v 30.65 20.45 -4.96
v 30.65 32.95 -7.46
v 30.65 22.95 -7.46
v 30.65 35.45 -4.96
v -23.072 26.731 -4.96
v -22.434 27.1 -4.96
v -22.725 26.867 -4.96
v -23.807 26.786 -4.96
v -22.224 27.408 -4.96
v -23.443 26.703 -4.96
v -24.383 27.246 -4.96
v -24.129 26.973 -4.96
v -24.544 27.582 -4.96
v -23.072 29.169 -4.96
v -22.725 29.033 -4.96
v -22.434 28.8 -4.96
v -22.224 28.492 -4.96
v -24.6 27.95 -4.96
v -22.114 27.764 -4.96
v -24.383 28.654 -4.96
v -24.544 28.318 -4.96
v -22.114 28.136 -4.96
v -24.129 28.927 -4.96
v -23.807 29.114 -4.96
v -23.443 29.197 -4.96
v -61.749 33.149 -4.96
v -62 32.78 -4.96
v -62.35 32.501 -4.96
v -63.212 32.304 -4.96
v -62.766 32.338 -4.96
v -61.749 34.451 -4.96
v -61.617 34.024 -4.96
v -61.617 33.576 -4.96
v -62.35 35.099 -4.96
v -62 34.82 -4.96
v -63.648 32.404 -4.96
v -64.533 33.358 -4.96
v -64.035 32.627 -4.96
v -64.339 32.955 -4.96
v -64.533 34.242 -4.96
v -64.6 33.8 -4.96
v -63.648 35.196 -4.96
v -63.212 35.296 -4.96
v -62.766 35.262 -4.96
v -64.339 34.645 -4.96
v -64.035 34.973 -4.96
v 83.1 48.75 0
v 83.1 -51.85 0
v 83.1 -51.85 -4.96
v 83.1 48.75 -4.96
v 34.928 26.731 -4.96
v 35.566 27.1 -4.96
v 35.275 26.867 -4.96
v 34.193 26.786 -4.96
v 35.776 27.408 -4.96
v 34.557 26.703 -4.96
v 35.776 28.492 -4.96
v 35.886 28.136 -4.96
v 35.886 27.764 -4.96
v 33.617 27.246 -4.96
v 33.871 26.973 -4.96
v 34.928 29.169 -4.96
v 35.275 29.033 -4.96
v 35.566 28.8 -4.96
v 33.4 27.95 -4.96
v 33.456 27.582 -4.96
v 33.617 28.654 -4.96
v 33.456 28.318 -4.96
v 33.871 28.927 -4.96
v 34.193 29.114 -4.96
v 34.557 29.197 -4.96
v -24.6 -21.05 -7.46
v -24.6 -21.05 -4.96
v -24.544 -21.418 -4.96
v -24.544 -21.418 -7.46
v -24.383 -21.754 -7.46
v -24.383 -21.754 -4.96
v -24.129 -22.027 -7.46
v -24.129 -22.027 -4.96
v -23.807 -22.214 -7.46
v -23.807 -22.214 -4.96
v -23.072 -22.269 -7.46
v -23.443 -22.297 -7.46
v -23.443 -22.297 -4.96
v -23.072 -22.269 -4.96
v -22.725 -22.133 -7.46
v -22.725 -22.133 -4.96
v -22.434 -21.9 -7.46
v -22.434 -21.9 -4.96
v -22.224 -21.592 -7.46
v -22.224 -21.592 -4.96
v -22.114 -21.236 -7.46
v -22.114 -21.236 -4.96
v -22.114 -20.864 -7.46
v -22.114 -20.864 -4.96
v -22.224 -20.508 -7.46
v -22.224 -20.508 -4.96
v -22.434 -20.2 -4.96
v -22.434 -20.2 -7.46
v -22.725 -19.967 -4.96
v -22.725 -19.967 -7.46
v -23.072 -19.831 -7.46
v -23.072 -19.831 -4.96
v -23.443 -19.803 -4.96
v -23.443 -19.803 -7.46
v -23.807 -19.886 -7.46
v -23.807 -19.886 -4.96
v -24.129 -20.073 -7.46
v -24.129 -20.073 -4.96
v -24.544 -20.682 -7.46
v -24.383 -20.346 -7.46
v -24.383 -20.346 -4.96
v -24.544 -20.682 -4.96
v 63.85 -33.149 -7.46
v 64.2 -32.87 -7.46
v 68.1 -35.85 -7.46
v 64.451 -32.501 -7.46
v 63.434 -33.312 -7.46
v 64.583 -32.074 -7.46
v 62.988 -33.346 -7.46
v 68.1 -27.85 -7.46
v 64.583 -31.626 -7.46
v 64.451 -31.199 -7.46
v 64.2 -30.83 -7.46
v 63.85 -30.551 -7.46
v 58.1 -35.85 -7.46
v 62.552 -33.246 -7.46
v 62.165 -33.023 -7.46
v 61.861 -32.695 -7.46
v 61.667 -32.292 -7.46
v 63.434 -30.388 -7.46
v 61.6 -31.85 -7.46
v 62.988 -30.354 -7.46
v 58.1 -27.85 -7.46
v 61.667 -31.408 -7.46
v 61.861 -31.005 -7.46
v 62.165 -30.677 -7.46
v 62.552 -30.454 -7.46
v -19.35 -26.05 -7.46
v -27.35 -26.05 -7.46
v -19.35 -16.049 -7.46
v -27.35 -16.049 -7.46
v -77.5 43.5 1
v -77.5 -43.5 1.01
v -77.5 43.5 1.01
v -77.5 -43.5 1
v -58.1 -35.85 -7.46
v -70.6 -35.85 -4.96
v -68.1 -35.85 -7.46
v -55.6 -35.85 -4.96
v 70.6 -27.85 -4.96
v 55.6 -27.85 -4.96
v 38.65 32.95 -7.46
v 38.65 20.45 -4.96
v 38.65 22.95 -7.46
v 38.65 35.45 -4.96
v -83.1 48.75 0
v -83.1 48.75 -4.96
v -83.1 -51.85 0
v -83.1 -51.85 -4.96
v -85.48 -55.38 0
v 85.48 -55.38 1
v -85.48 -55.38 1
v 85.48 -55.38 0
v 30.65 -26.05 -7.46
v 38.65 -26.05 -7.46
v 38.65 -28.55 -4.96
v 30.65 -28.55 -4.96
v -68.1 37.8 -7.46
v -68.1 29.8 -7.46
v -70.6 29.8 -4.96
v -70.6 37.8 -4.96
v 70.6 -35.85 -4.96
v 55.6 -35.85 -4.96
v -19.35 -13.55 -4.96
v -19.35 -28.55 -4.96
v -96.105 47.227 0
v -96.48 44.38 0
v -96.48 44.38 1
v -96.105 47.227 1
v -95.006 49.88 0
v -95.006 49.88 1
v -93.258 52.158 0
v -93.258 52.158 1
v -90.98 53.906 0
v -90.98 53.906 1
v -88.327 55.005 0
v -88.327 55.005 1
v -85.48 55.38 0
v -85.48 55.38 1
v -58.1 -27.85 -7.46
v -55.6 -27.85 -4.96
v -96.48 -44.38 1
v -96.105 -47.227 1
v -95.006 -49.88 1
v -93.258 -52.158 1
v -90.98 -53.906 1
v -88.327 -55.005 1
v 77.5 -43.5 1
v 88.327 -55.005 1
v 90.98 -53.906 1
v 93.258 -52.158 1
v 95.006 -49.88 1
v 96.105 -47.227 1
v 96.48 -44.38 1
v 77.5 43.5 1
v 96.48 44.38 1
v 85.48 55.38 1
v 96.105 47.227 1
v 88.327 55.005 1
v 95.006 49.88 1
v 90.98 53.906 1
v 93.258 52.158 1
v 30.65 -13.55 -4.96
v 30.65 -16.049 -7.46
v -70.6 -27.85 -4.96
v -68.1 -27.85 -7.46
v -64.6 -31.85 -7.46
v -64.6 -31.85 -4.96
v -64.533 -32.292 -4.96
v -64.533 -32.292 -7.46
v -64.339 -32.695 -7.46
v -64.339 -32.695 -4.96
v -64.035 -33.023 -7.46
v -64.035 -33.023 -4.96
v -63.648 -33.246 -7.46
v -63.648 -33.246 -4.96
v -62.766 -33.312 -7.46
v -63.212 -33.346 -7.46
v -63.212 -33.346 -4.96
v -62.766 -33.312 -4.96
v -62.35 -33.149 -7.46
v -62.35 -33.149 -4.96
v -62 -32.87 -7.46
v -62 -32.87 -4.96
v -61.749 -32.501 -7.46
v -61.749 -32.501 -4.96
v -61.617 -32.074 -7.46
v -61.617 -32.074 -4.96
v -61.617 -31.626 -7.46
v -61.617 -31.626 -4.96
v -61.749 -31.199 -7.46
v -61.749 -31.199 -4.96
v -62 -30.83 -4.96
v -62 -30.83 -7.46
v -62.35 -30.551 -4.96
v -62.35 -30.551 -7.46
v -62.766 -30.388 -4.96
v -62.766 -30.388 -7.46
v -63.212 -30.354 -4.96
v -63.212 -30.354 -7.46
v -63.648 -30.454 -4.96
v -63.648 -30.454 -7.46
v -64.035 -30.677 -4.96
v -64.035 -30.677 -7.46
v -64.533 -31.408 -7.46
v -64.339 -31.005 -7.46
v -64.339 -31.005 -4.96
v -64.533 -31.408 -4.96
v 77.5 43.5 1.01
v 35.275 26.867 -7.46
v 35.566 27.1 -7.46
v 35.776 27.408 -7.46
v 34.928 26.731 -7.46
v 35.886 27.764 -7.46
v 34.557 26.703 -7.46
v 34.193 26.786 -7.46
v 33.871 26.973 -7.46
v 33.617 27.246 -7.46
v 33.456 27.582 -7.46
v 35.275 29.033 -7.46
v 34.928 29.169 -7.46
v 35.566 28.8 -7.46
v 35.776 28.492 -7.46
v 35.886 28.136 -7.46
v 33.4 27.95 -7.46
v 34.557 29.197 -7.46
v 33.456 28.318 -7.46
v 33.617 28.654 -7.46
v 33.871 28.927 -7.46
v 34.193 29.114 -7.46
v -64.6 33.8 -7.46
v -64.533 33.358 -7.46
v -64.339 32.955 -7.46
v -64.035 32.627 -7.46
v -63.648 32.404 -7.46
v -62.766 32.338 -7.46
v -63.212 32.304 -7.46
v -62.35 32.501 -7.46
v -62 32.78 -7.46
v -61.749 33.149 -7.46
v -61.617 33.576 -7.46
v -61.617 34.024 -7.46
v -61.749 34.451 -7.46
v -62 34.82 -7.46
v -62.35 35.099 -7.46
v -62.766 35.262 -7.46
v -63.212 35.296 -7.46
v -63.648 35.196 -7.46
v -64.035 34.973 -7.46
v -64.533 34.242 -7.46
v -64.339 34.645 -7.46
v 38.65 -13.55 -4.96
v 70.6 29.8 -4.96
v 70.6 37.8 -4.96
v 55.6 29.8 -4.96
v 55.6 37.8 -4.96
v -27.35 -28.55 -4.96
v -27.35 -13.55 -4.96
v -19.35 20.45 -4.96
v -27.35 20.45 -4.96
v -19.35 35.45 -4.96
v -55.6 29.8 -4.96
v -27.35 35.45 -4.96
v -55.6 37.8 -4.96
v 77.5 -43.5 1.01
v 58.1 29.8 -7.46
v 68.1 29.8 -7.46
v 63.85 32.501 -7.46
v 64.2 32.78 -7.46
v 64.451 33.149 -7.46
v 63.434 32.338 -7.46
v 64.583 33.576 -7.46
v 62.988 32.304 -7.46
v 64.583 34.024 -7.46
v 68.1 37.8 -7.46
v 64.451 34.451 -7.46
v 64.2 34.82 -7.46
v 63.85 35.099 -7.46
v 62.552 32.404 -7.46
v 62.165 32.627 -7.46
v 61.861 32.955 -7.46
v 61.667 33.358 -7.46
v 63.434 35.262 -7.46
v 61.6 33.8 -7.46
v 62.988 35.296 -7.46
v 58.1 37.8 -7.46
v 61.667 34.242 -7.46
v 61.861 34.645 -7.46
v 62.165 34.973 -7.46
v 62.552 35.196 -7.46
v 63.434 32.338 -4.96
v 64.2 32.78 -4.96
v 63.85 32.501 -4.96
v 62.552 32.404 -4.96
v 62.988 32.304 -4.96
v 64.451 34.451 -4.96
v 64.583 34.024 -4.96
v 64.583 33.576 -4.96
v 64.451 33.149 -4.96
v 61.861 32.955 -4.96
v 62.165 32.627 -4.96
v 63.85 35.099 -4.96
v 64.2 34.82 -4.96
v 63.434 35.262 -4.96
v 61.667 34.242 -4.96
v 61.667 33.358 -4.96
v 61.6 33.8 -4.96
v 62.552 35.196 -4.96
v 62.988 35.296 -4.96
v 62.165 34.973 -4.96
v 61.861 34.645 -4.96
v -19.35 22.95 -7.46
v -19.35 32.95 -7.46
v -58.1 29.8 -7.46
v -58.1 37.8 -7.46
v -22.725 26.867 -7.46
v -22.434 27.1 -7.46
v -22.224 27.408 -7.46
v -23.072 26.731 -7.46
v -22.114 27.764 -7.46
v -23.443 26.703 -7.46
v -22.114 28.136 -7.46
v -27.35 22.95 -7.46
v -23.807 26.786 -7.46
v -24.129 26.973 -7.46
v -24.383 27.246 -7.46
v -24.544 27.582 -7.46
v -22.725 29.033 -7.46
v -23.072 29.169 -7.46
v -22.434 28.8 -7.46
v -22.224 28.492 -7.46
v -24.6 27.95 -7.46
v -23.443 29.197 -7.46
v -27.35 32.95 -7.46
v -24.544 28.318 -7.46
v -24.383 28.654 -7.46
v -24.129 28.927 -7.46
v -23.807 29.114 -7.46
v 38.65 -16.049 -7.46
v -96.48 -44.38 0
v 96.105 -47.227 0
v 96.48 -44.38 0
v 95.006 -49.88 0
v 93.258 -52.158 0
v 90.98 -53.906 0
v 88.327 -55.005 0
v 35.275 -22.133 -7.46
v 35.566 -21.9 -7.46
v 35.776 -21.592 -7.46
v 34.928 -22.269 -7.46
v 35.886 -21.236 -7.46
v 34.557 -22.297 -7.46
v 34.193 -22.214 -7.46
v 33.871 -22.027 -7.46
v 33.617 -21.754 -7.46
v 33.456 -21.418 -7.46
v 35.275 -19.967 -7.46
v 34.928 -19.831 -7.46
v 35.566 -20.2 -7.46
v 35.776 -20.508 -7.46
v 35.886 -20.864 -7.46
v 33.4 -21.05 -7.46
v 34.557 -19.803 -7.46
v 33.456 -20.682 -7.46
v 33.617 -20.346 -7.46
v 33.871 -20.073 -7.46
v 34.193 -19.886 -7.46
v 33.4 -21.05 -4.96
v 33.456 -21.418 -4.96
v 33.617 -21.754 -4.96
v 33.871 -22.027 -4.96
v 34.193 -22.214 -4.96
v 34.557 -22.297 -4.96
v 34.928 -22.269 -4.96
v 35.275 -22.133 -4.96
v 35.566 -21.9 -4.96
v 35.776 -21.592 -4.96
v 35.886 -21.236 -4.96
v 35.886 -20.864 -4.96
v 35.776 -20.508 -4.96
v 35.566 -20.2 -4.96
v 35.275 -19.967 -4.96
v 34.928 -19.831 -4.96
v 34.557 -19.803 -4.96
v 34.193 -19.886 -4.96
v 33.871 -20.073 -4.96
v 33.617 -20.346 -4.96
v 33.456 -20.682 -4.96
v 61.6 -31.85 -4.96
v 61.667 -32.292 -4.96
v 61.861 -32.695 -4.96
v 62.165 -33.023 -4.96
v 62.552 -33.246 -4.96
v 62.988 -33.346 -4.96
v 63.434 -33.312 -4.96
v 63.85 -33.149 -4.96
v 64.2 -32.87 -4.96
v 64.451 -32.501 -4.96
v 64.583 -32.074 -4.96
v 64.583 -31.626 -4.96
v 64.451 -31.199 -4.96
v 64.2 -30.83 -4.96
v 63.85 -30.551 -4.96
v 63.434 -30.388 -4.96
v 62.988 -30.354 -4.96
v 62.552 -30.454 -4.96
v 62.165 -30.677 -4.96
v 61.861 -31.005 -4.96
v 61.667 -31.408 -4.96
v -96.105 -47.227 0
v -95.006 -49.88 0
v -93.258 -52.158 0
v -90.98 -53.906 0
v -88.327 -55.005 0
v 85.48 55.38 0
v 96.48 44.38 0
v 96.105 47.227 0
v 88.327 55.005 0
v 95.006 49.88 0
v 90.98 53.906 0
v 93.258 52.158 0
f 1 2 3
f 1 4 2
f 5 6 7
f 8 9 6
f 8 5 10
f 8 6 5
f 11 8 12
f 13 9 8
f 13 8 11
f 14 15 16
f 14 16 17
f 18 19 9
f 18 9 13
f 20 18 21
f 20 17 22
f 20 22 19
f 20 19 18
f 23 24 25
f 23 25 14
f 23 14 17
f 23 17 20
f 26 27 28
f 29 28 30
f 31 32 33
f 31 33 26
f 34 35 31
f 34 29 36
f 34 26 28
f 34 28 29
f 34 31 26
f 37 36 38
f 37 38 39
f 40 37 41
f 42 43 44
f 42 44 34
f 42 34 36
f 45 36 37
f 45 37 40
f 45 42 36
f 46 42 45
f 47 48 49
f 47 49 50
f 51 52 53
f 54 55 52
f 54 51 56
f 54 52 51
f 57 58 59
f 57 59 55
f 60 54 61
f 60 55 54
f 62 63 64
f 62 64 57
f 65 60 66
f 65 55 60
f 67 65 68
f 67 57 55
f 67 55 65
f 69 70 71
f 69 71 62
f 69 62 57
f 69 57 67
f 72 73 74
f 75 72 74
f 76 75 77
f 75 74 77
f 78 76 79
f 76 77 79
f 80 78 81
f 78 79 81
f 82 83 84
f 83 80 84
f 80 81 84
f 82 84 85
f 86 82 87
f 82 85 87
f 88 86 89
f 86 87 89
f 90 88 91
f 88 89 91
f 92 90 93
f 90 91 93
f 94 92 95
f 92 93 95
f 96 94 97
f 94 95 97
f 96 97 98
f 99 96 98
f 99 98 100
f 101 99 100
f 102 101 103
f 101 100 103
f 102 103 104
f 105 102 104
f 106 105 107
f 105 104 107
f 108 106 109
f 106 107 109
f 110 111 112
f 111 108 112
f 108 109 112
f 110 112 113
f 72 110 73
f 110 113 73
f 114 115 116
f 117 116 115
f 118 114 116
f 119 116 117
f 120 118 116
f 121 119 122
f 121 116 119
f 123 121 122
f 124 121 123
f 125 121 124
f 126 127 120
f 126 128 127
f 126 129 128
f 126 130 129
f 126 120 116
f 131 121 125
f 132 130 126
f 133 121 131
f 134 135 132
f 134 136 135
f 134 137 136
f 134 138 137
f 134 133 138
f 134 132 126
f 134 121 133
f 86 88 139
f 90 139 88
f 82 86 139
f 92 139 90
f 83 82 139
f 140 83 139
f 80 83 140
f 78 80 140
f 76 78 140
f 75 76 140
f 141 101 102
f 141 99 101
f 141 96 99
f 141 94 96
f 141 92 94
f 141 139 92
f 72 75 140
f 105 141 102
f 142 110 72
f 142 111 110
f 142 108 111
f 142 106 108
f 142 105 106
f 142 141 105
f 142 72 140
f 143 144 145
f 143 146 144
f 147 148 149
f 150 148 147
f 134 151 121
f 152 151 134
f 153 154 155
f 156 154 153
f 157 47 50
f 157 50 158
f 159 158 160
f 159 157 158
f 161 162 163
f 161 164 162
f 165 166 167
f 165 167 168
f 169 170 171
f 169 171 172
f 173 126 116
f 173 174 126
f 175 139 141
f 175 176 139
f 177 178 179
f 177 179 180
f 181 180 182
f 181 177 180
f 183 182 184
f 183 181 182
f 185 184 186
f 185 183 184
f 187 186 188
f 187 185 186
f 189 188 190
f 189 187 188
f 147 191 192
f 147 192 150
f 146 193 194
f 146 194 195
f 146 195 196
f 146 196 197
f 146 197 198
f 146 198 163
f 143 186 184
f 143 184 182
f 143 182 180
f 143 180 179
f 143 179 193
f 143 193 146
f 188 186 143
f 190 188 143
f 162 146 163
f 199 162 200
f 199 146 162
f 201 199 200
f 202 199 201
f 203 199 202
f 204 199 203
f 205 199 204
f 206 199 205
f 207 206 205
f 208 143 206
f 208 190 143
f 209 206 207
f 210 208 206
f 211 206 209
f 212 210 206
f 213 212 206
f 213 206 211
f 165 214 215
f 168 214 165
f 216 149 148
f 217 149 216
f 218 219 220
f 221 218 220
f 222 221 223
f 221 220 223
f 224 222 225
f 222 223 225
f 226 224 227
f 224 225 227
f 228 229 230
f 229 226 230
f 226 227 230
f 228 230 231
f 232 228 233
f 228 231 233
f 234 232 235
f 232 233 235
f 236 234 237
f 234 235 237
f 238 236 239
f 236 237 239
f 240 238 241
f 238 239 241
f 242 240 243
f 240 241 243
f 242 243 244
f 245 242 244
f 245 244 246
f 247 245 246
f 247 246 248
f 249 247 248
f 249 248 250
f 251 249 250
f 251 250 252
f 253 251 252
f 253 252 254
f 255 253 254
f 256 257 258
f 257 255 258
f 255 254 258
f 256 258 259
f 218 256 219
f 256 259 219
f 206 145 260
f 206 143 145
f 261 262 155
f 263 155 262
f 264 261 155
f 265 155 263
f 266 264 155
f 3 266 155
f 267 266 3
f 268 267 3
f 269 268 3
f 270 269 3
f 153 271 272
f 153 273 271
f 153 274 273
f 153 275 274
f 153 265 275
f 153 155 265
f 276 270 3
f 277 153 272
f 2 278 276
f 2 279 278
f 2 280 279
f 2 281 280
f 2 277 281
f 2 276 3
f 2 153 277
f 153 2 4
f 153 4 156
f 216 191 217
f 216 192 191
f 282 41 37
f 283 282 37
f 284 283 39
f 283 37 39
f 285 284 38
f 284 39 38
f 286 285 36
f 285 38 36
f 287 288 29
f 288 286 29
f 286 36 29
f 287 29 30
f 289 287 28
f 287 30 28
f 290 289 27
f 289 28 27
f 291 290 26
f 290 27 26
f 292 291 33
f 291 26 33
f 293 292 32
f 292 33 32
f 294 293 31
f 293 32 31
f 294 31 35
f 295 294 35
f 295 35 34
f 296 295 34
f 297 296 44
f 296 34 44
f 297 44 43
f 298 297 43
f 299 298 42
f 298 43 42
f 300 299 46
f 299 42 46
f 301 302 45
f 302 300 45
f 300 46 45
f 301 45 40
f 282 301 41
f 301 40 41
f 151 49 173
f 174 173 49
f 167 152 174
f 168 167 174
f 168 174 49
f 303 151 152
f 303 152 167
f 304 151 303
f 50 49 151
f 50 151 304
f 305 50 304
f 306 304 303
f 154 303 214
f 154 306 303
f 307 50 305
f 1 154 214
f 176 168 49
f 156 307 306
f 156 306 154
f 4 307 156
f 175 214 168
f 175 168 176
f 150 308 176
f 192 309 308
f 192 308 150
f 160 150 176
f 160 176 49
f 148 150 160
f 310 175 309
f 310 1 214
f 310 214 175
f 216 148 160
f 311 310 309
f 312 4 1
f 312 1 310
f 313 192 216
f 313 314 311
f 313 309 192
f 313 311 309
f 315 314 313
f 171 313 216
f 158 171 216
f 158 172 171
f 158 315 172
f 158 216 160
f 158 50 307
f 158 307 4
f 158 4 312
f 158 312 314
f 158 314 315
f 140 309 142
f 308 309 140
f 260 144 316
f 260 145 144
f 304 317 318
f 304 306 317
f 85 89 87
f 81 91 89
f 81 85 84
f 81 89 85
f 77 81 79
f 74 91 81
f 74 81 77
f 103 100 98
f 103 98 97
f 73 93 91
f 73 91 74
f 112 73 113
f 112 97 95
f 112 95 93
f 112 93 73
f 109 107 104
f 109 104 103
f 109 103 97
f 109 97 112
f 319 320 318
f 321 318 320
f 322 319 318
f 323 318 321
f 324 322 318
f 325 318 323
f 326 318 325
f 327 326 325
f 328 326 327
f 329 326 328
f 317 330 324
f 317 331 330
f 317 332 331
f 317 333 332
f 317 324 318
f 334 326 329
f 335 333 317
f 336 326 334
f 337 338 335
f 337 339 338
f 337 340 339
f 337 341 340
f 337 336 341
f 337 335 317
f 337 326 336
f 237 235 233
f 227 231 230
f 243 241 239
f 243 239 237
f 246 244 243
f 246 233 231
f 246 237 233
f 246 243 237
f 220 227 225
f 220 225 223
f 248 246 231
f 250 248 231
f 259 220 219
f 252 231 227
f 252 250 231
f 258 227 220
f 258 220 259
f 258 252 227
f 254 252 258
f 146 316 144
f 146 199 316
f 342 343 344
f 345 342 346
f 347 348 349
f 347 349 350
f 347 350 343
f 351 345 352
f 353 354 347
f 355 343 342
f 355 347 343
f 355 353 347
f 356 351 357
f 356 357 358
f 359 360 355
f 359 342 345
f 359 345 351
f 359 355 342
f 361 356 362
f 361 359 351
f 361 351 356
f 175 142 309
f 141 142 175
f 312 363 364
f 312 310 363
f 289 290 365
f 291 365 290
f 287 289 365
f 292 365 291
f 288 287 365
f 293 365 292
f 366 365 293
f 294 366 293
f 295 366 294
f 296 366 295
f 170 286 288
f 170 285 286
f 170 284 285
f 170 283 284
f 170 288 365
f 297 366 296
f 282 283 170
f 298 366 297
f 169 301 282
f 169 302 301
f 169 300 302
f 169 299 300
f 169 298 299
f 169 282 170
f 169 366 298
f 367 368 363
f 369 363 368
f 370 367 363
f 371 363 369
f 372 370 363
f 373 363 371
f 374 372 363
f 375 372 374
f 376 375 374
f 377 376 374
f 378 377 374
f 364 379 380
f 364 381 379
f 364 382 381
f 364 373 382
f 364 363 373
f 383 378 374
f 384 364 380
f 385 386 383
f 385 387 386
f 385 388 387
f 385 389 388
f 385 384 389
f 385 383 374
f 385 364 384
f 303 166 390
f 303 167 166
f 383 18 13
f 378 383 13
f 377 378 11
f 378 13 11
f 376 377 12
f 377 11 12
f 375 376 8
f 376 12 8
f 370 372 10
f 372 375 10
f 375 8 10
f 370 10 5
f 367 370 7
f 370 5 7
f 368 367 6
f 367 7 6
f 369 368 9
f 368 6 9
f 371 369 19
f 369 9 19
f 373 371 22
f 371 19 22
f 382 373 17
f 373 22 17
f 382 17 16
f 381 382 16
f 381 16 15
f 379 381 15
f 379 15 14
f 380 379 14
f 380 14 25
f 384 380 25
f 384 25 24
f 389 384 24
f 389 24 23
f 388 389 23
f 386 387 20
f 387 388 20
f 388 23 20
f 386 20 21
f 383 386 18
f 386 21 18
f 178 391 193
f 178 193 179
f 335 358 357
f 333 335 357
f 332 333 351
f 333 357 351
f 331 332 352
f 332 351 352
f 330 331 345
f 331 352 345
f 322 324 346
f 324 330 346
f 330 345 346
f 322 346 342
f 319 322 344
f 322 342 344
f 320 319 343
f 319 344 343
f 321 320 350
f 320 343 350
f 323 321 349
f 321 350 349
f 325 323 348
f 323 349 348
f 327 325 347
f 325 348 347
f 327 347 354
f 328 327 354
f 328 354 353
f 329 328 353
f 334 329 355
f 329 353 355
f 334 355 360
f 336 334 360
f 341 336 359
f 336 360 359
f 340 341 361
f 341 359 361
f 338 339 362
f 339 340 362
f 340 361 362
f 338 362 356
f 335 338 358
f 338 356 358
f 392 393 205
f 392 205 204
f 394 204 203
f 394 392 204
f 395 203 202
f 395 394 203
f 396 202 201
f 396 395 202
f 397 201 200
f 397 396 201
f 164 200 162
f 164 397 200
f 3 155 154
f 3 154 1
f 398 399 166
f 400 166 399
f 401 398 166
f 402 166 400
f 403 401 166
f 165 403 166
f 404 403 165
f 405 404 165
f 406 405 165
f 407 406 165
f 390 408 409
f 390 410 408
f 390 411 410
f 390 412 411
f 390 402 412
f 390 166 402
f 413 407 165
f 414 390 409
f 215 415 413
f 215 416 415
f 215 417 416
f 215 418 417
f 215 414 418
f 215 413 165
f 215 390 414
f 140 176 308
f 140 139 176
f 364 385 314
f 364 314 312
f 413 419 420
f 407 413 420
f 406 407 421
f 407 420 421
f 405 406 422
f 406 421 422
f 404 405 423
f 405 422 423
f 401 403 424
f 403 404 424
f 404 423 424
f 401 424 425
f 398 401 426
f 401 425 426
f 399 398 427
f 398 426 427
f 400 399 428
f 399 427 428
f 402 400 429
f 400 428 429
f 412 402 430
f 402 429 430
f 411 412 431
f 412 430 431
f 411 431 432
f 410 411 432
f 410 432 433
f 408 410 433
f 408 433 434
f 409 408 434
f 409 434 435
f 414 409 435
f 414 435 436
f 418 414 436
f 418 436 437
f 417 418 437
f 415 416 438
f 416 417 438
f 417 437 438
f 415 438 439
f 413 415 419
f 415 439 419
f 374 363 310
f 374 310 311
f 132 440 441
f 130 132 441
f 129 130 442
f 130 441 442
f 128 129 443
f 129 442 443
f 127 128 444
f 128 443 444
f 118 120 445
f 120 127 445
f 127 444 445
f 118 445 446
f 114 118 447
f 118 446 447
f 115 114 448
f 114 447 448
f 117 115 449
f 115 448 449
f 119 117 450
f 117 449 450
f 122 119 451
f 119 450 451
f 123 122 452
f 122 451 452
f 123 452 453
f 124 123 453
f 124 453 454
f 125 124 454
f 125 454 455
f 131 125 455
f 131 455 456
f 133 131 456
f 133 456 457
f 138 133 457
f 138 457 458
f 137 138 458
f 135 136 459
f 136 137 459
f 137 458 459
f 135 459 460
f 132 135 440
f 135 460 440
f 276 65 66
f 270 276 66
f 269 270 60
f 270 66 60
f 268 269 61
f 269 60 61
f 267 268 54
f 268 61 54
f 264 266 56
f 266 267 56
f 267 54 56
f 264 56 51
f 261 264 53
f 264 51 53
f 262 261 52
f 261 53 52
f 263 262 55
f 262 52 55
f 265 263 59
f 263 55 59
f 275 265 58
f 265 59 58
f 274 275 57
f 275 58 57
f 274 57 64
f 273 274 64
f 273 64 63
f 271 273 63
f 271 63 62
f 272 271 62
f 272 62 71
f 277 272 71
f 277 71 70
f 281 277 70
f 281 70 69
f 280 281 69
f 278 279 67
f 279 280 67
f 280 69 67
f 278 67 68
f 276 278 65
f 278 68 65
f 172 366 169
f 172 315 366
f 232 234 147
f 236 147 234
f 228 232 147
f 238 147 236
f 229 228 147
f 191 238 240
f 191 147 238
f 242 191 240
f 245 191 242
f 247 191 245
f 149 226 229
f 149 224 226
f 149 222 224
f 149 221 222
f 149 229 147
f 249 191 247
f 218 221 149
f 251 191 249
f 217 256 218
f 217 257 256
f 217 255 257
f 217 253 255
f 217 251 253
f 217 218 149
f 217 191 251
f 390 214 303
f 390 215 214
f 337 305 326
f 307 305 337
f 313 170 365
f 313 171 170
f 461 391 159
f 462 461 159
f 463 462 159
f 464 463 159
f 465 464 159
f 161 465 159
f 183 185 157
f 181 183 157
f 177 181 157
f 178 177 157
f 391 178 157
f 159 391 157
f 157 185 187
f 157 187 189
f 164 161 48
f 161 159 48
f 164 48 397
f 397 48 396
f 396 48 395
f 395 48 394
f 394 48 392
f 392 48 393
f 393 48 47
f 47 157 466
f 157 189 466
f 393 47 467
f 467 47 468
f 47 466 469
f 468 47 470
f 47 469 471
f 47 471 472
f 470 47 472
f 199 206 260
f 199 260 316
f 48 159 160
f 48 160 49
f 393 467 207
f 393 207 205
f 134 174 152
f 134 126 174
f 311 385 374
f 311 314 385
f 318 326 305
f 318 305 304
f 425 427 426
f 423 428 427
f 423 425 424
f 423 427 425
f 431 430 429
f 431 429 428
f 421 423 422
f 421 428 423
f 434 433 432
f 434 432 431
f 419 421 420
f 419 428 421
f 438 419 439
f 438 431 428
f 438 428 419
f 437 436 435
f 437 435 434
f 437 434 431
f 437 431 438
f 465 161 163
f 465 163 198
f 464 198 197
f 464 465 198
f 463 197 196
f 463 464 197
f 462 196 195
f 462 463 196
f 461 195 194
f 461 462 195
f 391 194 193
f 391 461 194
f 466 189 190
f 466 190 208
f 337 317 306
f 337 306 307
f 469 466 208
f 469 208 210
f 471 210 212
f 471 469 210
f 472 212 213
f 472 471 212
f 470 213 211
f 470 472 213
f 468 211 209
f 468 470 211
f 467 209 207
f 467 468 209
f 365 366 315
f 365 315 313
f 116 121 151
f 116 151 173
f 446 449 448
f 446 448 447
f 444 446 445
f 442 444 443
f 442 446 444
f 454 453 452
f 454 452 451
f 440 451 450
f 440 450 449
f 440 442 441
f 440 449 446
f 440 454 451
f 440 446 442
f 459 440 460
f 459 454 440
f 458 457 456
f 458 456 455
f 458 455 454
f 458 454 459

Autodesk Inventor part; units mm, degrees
ref_plane "YZ Plane" through (0, 0, 0) normal (1, 0, 0) x (0, 1, 0)
ref_plane "XZ Plane" through (0, 0, 0) normal (0, 1, 0) x (-1, 0, 0)
ref_plane "XY Plane" through (0, 0, 0) normal (0, 0, 1) x (1, 0, 0)
sketch "Sketch1" plane through (0, 0, 0) normal (0, 0, 1) x (1, 0, 0)
  line L0 (-85.48, 55.38) -> (85.48, 55.38)
  line L1 (96.48, 44.38) -> (96.48, -44.38)
  line L2 (85.48, -55.38) -> (-85.48, -55.38)
  line L3 (-96.48, -44.38) -> (-96.48, 44.38)
  arc A0 (-85.48, 55.38) -> (-96.48, 44.38) centre (-85.48, 44.38) ccw
  arc A1 (96.48, 44.38) -> (85.48, 55.38) centre (85.48, 44.38) ccw
  arc A2 (85.48, -55.38) -> (96.48, -44.38) centre (85.48, -44.38) ccw
  arc A3 (-96.48, -44.38) -> (-85.48, -55.38) centre (-85.48, -44.38) ccw
  point P0 (0, 0)
  point P1 (-96.48, 55.38)
  point P2 (96.48, 55.38)
  point P3 (-96.48, -55.38)
  dimension "d0" = 192.96
  dimension "d1" = 110.76
  dimension "d2" = 96.48
  dimension "d3" = 55.38
  dimension "d6" = 11
extrude "Extrusion2" add sketch "Sketch1" along normal blind 1
sketch "Sketch3" plane through (0, 0, 0) normal (0, 0, -1) x (-1, 0, 0)
  line L0 (-83.1, 48.75) -> (83.1, 48.75)
  line L1 (83.1, 48.75) -> (83.1, -51.85)
  line L2 (83.1, -51.85) -> (-83.1, -51.85)
  line L3 (-83.1, -51.85) -> (-83.1, 48.75)
  line L4 (85.48, 55.38) -> (-85.48, 55.38) projected
  point P0 (0, 0)
  dimension "d9" = 166.2
  dimension "d10" = 100.6
  dimension "d12" = 83.1
  dimension "d13" = 6.63
extrude "Extrusion3" add sketch "Sketch3" along normal blind 4.96
sketch "Sketch4" plane through (0, 0, -4.96) normal (0, 0, -1) x (-1, 0, 0)
  line L0 (-70.6, 37.8) -> (-55.6, 37.8)
  line L1 (-55.6, 37.8) -> (-55.6, 29.8)
  line L2 (-55.6, 29.8) -> (-70.6, 29.8)
  line L3 (-70.6, 29.8) -> (-70.6, 37.8)
  circle A0 centre (-63.1, 33.8) radius 1.5
  line L4 (-83.1, 48.75) -> (-83.1, -51.85) projected
  line L5 (55.6, 37.8) -> (70.6, 37.8)
  circle A1 centre (63.1, 33.8) radius 1.5
  line L6 (55.6, 29.8) -> (55.6, 37.8)
  line L7 (70.6, 29.8) -> (55.6, 29.8)
  line L8 (70.6, 37.8) -> (70.6, 29.8)
  line L9 (-70.6, -27.85) -> (-55.6, -27.85)
  circle A2 centre (-63.1, -31.85) radius 1.5
  line L10 (-70.6, -35.85) -> (-70.6, -27.85)
  line L11 (-55.6, -35.85) -> (-70.6, -35.85)
  line L12 (-55.6, -27.85) -> (-55.6, -35.85)
  line L13 (55.6, -27.85) -> (70.6, -27.85)
  circle A3 centre (63.1, -31.85) radius 1.5
  line L14 (55.6, -35.85) -> (55.6, -27.85)
  line L15 (70.6, -35.85) -> (55.6, -35.85)
  line L16 (70.6, -27.85) -> (70.6, -35.85)
  line L17 (83.1, 48.75) -> (-83.1, 48.75) projected
  line L18 (-38.65, 20.45) -> (-38.65, 35.45)
  circle A4 centre (-34.65, 27.95) radius 1.25
  line L19 (-30.65, 20.45) -> (-38.65, 20.45)
  line L20 (-30.65, 35.45) -> (-30.65, 20.45)
  line L21 (-38.65, 35.45) -> (-30.65, 35.45)
  line L22 (83.1, -51.85) -> (83.1, 48.75) projected
  line L23 (85.48, 55.38) -> (-85.48, 55.38) projected
  line L24 (19.35, 20.45) -> (19.35, 35.45)
  line L25 (19.35, 35.45) -> (27.35, 35.45)
  line L26 (27.35, 35.45) -> (27.35, 20.45)
  line L27 (27.35, 20.45) -> (19.35, 20.45)
  circle A5 centre (23.35, 27.95) radius 1.25
  line L28 (-38.65, -28.55) -> (-38.65, -13.55)
  line L29 (-38.65, -13.55) -> (-30.65, -13.55)
  line L30 (-30.65, -13.55) -> (-30.65, -28.55)
  line L31 (-30.65, -28.55) -> (-38.65, -28.55)
  circle A6 centre (-34.65, -21.05) radius 1.25
  line L32 (19.35, -28.55) -> (19.35, -13.55)
  line L33 (19.35, -13.55) -> (27.35, -13.55)
  line L34 (27.35, -13.55) -> (27.35, -28.55)
  line L35 (27.35, -28.55) -> (19.35, -28.55)
  circle A7 centre (23.35, -21.05) radius 1.25
  point P0 (0, 0)
  point P1 (-55.6, 33.8)
  point P2 (-63.1, 37.8)
  point P3 (63.1, 37.8)
  point P4 (70.6, 33.8)
  point P5 (-63.1, -27.85)
  point P6 (-55.6, -31.85)
  point P7 (63.1, -27.85)
  point P8 (70.6, -31.85)
  point P9 (64.6875, 33.5375)
  point P10 (72.1875, 29.5375)
  point P11 (-38.65, 27.95)
  point P12 (-34.65, 35.45)
  point P13 (122.6875, 33.5375)
  point P14 (19.35, 27.95)
  point P15 (130.1875, 29.5375)
  point P16 (23.35, 35.45)
  point P17 (64.6875, -15.4625)
  point P18 (-38.65, -21.05)
  point P19 (72.1875, -19.4625)
  point P20 (-34.65, -13.55)
  point P21 (122.6875, -15.4625)
  point P22 (19.35, -21.05)
  point P23 (130.1875, -19.4625)
  point P24 (23.35, -13.55)
  dimension "d16" = 15
  dimension "d17" = 8
  dimension "d18" = 3
  dimension "d19" = 20
  dimension "d22" = 126.2
  dimension "d25" = 65.65
  dimension "d29" = 2.5
  dimension "d30" = 20.8
  dimension "d32" = 48.45
  dimension "d33" = 21.58
  dimension "d44" = 58
  dimension "d47" = 49
extrude "Extrusion4" add sketch "Sketch4" along normal blind 2.5
chamfer "Chamfer1" distance 2.5 angle 45 16 edges at (70.6, 33.8, -7.46) (55.6, 33.8, -7.46) (34.65, 35.45, -7.46) (34.65, 20.45, -7.46) (-23.35, 35.45, -7.46) (-23.35, 20.45, -7.46) (-55.6, 33.8, -7.46) (-70.6, 33.8, -7.46) (70.6, -31.85, -7.46) (55.6, -31.85, -7.46) (34.65, -13.55, -7.46) (34.65, -28.55, -7.46) (-23.35, -13.55, -7.46) (-23.35, -28.55, -7.46) (-55.6, -31.85, -7.46) (-70.6, -31.85, -7.46)
sketch "Sketch5" plane through (0, 0, 1) normal (0, 0, 1) x (1, 0, 0)
  line L0 (-77.5, 43.5) -> (77.5, 43.5)
  line L1 (77.5, 43.5) -> (77.5, -43.5)
  line L2 (77.5, -43.5) -> (-77.5, -43.5)
  line L3 (-77.5, -43.5) -> (-77.5, 43.5)
  point P0 (0, 0)
  dimension "d55" = 155
  dimension "d56" = 87
  dimension "d57" = 43.5
  dimension "d58" = 77.5
extrude "Extrusion5" add sketch "Sketch5" along normal blind 0.01
equation "\"d2\" = 0.5 * d0"
equation "\"d3\" = 0.5 * d1"
equation "\"d12\" = 0.5 * d9"
equation "\"d57\" = 0.5 * d56"
equation "\"d58\" = 0.5 * d55"
properties part number "Touchscreen"
